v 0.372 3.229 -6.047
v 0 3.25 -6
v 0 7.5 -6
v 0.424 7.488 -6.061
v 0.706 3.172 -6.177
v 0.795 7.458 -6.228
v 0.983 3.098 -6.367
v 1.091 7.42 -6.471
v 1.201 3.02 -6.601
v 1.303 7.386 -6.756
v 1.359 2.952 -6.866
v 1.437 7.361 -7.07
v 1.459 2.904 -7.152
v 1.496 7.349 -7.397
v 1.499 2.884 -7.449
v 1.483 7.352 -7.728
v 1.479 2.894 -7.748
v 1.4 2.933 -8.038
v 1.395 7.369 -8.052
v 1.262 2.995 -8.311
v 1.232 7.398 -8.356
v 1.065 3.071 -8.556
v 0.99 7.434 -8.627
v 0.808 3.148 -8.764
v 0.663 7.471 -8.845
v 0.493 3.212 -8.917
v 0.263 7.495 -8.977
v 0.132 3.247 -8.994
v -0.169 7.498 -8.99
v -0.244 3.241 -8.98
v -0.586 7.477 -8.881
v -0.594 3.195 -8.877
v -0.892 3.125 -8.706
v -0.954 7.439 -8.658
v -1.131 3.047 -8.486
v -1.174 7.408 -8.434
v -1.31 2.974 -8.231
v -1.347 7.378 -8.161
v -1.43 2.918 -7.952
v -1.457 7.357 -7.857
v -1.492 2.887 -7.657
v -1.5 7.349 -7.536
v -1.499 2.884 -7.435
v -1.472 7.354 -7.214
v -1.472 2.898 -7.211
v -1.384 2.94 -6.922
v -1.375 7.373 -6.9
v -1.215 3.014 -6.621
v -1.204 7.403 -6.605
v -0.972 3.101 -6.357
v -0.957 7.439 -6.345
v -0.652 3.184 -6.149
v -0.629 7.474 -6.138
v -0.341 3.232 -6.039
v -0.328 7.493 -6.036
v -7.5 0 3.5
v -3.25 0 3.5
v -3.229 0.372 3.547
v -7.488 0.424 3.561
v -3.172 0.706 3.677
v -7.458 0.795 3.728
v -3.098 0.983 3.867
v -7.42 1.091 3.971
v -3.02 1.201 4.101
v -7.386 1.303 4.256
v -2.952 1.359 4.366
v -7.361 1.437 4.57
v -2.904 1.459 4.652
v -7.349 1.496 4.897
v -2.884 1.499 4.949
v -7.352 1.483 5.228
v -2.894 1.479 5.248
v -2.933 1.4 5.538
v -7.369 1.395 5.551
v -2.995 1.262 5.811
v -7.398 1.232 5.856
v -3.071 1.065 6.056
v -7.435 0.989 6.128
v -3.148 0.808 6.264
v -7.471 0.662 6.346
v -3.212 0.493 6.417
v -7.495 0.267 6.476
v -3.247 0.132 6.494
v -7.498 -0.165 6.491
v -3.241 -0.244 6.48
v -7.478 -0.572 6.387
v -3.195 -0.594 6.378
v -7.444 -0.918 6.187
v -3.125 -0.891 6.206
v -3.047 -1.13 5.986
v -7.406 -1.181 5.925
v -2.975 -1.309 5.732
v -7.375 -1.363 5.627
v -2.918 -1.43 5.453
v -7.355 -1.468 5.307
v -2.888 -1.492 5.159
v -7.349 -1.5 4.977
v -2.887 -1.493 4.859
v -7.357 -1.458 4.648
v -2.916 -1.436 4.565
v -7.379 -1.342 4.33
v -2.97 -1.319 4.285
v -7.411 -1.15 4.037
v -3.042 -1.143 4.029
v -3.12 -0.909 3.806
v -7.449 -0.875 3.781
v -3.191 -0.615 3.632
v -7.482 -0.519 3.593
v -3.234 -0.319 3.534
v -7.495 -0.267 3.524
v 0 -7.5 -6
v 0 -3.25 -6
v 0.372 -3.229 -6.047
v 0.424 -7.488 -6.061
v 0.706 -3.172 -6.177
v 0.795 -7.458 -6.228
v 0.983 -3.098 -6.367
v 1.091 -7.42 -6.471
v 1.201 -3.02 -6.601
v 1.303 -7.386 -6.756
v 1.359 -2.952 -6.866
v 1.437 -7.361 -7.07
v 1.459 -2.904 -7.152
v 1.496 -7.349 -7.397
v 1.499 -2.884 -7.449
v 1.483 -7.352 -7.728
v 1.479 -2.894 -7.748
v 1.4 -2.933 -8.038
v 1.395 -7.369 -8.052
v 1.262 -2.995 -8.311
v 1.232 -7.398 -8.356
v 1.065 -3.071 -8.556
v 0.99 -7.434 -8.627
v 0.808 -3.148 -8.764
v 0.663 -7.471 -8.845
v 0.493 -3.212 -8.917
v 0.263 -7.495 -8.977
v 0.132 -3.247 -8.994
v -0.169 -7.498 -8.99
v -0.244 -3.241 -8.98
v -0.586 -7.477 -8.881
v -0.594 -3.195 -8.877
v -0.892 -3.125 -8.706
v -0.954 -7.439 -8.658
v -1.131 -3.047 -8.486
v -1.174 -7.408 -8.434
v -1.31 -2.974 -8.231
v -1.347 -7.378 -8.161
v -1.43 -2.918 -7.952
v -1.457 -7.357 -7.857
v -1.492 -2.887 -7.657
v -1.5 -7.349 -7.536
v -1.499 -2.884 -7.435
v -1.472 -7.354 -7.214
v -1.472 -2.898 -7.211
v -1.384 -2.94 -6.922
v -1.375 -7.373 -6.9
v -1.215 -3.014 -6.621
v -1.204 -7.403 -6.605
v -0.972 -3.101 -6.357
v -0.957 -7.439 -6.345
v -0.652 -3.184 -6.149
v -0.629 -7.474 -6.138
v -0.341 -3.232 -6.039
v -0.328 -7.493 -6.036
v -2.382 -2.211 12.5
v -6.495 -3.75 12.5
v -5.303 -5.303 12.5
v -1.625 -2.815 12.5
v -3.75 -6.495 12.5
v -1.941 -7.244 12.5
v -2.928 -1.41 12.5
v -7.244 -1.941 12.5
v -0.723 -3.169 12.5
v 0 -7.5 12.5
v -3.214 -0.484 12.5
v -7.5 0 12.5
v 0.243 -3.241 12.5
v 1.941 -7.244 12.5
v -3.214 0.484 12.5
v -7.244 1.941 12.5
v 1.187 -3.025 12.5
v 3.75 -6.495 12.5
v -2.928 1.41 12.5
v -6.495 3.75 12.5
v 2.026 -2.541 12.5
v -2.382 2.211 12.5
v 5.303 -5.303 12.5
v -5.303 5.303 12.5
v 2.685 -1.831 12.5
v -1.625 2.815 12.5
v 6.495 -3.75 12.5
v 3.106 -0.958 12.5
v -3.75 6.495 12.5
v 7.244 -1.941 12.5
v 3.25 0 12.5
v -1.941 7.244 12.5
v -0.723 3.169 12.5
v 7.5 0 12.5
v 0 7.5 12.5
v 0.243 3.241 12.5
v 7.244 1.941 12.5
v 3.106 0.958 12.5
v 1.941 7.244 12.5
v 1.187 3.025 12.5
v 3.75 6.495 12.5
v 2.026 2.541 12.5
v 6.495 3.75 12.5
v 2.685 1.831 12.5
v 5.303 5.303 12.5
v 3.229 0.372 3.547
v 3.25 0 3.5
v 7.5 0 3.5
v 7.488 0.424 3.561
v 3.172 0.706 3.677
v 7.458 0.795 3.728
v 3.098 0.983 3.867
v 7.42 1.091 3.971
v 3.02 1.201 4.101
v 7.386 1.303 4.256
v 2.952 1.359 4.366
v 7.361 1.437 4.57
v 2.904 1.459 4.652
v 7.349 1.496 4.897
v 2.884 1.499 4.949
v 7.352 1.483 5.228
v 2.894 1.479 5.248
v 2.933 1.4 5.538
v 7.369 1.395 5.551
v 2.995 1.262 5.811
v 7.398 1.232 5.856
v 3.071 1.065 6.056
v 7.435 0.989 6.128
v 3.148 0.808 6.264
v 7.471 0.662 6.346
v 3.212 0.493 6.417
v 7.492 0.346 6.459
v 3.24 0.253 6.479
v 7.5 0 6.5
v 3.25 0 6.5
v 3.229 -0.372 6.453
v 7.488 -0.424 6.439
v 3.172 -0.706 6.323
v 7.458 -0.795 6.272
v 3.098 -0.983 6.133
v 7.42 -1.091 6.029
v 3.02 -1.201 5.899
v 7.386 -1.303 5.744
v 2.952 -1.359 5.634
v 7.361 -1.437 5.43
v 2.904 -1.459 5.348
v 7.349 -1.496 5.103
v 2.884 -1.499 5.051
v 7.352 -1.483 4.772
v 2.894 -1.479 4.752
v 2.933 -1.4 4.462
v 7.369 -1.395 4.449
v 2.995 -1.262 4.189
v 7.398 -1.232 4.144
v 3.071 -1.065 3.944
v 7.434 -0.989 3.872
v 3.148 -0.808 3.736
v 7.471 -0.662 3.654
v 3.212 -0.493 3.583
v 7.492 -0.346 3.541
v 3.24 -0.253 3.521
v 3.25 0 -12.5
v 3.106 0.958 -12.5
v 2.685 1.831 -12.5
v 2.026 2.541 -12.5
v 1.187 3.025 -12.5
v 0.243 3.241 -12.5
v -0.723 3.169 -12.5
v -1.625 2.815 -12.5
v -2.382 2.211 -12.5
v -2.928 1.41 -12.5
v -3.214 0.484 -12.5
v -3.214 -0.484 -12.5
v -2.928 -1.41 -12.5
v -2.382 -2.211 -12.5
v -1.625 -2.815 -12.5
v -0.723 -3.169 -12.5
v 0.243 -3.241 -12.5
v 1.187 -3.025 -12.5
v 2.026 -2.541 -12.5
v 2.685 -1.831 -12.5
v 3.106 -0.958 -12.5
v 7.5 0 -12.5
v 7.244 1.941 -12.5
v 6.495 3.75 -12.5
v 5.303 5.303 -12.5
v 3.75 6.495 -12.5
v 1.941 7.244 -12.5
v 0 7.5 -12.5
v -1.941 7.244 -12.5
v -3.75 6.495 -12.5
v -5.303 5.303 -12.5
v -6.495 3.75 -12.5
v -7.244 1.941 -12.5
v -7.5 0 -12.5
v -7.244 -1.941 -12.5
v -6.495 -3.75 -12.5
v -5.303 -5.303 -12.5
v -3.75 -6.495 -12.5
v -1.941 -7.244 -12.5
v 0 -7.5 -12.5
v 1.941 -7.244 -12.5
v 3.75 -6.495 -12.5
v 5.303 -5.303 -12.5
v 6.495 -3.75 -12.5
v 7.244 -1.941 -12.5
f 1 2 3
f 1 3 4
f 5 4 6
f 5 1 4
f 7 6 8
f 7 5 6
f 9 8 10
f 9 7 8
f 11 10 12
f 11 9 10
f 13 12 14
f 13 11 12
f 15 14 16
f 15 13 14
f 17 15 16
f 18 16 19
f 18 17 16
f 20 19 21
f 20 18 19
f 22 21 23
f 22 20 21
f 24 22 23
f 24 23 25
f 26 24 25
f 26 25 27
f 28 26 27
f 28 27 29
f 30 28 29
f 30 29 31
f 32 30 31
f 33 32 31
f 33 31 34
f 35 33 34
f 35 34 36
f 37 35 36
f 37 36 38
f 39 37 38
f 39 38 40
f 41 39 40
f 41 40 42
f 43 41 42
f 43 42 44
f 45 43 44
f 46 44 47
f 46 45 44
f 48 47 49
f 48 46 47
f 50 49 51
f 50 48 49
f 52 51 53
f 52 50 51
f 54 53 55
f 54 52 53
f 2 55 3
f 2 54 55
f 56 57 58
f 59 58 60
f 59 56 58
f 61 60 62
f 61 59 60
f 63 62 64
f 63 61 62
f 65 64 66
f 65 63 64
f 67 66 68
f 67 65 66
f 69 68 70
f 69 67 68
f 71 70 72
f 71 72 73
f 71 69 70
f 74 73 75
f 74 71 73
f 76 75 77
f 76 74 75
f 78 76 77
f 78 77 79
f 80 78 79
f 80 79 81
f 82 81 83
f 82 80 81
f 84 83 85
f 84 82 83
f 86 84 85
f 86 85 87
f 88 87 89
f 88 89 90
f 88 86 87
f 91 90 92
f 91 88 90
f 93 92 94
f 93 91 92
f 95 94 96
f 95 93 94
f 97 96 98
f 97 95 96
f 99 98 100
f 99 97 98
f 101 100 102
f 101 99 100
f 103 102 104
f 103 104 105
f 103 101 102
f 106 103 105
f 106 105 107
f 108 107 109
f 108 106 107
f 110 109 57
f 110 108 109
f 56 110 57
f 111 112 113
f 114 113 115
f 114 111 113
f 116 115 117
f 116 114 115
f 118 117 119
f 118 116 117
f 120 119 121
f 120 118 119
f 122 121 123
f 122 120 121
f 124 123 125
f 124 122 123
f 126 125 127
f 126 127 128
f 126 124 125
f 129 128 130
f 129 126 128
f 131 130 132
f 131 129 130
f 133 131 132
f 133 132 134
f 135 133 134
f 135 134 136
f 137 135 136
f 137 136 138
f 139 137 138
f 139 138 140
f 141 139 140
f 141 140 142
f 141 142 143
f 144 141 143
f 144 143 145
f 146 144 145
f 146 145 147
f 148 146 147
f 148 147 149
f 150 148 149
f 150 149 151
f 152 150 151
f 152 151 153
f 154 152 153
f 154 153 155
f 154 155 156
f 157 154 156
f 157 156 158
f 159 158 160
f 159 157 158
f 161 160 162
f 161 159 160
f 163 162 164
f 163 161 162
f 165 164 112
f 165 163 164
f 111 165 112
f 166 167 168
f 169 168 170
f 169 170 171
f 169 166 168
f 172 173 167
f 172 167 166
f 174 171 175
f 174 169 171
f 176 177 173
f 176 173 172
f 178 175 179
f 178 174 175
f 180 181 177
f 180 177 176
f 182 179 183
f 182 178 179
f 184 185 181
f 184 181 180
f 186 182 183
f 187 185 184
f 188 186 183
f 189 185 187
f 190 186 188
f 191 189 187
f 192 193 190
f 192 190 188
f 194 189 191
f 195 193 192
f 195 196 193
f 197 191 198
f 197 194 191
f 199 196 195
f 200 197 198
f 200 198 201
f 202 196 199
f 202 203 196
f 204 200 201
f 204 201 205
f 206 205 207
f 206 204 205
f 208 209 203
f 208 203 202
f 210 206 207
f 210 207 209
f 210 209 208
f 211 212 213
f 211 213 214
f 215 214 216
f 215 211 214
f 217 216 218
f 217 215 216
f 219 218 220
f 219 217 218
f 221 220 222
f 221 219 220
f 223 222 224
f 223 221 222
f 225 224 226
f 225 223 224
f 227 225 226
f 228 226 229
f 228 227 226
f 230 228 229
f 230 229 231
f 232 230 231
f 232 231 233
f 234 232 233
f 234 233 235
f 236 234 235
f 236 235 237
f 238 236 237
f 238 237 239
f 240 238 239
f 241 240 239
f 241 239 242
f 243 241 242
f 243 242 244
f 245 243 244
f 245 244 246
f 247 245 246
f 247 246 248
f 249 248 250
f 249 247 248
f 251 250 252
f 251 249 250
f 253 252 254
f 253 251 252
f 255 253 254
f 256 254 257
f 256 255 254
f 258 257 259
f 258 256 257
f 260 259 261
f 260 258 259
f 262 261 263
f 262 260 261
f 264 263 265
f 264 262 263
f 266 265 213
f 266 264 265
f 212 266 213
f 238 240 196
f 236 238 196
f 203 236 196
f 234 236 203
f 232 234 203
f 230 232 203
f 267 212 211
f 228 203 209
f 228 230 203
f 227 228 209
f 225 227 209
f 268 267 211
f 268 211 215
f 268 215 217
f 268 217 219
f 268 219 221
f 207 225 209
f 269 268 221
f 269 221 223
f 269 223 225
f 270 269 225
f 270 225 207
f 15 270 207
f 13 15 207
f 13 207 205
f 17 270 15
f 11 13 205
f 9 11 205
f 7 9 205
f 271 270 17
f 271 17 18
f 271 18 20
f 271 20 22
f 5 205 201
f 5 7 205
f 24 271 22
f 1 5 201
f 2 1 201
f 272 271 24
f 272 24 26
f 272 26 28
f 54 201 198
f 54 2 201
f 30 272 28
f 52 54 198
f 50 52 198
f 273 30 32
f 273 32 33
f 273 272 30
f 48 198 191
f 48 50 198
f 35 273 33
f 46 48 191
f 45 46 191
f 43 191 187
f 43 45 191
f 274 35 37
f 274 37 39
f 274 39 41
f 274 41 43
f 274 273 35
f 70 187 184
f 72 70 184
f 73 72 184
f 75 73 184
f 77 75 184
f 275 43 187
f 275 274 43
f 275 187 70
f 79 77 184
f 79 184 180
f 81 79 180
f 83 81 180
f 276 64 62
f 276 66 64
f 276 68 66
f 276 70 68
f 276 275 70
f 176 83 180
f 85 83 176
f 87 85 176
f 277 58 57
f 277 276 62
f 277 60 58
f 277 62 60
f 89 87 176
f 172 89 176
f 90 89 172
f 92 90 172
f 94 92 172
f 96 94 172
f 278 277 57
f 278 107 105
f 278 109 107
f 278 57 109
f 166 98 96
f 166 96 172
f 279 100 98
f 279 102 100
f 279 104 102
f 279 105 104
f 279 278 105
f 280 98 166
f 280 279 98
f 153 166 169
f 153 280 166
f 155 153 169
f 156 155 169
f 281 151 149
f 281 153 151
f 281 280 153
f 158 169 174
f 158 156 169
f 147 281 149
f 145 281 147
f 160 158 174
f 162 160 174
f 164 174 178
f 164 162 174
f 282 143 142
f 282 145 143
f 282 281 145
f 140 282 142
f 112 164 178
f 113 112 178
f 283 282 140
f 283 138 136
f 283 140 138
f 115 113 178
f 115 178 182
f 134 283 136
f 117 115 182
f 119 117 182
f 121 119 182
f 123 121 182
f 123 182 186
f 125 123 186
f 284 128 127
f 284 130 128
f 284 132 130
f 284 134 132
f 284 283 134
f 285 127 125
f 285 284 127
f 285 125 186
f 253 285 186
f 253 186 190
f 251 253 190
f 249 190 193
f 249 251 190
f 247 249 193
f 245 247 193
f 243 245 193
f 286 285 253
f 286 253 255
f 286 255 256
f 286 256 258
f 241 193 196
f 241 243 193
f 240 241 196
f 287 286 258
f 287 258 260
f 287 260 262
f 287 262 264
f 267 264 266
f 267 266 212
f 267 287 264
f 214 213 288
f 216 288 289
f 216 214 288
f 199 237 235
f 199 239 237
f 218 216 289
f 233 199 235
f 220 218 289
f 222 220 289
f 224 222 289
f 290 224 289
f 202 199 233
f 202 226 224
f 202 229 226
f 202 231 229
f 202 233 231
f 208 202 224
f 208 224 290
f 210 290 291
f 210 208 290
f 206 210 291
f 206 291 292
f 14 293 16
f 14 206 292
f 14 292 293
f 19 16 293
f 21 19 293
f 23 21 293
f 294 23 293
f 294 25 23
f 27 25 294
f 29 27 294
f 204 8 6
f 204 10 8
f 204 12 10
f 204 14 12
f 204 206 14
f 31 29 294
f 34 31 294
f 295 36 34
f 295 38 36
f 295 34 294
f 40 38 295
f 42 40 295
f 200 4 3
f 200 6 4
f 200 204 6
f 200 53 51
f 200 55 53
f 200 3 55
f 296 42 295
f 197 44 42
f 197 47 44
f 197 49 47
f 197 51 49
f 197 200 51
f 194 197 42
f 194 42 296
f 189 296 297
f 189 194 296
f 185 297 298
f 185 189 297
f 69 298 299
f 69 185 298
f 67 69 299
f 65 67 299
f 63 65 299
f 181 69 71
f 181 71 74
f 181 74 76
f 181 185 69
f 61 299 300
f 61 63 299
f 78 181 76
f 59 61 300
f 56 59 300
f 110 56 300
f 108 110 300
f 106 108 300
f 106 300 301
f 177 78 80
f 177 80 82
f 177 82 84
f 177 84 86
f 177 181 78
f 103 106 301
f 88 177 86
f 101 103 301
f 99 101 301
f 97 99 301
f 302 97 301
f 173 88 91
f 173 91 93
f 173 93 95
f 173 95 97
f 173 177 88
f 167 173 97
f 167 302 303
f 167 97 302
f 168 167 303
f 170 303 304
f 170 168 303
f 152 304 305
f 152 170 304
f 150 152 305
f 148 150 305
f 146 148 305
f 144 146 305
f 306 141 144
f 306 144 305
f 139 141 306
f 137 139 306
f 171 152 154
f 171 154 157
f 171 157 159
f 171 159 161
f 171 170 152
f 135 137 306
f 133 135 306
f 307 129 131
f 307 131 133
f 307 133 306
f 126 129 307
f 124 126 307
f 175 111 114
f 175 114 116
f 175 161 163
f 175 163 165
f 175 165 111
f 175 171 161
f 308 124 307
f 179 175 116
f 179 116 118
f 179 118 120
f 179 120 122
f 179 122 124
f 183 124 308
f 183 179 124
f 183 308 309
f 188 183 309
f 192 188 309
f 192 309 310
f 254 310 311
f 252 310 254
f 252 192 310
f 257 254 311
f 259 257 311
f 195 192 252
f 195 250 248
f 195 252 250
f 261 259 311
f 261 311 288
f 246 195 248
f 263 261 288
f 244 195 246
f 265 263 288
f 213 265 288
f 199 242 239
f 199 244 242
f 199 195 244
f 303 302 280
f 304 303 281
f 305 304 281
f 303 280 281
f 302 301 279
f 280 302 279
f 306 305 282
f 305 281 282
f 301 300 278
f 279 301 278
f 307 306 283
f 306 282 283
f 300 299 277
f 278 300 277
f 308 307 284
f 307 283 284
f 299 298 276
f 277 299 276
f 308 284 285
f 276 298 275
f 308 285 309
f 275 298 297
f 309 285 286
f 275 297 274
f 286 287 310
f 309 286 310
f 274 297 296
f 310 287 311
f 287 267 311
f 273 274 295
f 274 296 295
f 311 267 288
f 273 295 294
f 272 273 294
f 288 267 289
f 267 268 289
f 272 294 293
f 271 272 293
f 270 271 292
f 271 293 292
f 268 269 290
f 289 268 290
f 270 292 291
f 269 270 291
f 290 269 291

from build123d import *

# Parameters (mm, degrees)
SKETCH3_R               = 7.5
SKETCH3_R_2             = 3.25
BOSS_EXTRUDE1_DEPTH     = 12.5
CUT_EXTRUDE1_DEPTH      = 17.393596311
CUT_EXTRUDE1_DEPTH_BACK = 17.393596311
SKETCH4_R               = 1.5
CUT_EXTRUDE2_DEPTH      = 17.393596479
CUT_EXTRUDE2_DEPTH_BACK = 17.393596479
SKETCH5_R               = 1.5


with BuildPart() as part:
    # Sketch3 → Boss-Extrude1 (new, symmetric)
    with BuildSketch(Plane.XY):
        Circle(SKETCH3_R)
        Circle(SKETCH3_R_2, mode=Mode.SUBTRACT)
    extrude(amount=BOSS_EXTRUDE1_DEPTH, both=True)

    # Sketch4 → Cut-Extrude1 (cut, two sides: drawn at the far end of the back side and taken through both)
    with BuildSketch(Plane(origin=(0, 0, 0), x_dir=(0, 0, -1), z_dir=(1, 0, 0)).offset(-CUT_EXTRUDE1_DEPTH_BACK)):
        with Locations((-5, 0)):
            Circle(SKETCH4_R)
    extrude(amount=CUT_EXTRUDE1_DEPTH + CUT_EXTRUDE1_DEPTH_BACK, mode=Mode.SUBTRACT)

    # Sketch5 → Cut-Extrude2 (cut, two sides: drawn at the far end of the back side and taken through both)
    with BuildSketch(Plane(origin=(0, 0, 0), x_dir=(1, 0, 0), z_dir=(0, 1, 0)).offset(-CUT_EXTRUDE2_DEPTH_BACK)):
        with Locations(Location((0, 7.5, 0), (0, 0, 270))):
            Circle(SKETCH5_R)
    extrude(amount=CUT_EXTRUDE2_DEPTH + CUT_EXTRUDE2_DEPTH_BACK, mode=Mode.SUBTRACT)


solid = part.part
